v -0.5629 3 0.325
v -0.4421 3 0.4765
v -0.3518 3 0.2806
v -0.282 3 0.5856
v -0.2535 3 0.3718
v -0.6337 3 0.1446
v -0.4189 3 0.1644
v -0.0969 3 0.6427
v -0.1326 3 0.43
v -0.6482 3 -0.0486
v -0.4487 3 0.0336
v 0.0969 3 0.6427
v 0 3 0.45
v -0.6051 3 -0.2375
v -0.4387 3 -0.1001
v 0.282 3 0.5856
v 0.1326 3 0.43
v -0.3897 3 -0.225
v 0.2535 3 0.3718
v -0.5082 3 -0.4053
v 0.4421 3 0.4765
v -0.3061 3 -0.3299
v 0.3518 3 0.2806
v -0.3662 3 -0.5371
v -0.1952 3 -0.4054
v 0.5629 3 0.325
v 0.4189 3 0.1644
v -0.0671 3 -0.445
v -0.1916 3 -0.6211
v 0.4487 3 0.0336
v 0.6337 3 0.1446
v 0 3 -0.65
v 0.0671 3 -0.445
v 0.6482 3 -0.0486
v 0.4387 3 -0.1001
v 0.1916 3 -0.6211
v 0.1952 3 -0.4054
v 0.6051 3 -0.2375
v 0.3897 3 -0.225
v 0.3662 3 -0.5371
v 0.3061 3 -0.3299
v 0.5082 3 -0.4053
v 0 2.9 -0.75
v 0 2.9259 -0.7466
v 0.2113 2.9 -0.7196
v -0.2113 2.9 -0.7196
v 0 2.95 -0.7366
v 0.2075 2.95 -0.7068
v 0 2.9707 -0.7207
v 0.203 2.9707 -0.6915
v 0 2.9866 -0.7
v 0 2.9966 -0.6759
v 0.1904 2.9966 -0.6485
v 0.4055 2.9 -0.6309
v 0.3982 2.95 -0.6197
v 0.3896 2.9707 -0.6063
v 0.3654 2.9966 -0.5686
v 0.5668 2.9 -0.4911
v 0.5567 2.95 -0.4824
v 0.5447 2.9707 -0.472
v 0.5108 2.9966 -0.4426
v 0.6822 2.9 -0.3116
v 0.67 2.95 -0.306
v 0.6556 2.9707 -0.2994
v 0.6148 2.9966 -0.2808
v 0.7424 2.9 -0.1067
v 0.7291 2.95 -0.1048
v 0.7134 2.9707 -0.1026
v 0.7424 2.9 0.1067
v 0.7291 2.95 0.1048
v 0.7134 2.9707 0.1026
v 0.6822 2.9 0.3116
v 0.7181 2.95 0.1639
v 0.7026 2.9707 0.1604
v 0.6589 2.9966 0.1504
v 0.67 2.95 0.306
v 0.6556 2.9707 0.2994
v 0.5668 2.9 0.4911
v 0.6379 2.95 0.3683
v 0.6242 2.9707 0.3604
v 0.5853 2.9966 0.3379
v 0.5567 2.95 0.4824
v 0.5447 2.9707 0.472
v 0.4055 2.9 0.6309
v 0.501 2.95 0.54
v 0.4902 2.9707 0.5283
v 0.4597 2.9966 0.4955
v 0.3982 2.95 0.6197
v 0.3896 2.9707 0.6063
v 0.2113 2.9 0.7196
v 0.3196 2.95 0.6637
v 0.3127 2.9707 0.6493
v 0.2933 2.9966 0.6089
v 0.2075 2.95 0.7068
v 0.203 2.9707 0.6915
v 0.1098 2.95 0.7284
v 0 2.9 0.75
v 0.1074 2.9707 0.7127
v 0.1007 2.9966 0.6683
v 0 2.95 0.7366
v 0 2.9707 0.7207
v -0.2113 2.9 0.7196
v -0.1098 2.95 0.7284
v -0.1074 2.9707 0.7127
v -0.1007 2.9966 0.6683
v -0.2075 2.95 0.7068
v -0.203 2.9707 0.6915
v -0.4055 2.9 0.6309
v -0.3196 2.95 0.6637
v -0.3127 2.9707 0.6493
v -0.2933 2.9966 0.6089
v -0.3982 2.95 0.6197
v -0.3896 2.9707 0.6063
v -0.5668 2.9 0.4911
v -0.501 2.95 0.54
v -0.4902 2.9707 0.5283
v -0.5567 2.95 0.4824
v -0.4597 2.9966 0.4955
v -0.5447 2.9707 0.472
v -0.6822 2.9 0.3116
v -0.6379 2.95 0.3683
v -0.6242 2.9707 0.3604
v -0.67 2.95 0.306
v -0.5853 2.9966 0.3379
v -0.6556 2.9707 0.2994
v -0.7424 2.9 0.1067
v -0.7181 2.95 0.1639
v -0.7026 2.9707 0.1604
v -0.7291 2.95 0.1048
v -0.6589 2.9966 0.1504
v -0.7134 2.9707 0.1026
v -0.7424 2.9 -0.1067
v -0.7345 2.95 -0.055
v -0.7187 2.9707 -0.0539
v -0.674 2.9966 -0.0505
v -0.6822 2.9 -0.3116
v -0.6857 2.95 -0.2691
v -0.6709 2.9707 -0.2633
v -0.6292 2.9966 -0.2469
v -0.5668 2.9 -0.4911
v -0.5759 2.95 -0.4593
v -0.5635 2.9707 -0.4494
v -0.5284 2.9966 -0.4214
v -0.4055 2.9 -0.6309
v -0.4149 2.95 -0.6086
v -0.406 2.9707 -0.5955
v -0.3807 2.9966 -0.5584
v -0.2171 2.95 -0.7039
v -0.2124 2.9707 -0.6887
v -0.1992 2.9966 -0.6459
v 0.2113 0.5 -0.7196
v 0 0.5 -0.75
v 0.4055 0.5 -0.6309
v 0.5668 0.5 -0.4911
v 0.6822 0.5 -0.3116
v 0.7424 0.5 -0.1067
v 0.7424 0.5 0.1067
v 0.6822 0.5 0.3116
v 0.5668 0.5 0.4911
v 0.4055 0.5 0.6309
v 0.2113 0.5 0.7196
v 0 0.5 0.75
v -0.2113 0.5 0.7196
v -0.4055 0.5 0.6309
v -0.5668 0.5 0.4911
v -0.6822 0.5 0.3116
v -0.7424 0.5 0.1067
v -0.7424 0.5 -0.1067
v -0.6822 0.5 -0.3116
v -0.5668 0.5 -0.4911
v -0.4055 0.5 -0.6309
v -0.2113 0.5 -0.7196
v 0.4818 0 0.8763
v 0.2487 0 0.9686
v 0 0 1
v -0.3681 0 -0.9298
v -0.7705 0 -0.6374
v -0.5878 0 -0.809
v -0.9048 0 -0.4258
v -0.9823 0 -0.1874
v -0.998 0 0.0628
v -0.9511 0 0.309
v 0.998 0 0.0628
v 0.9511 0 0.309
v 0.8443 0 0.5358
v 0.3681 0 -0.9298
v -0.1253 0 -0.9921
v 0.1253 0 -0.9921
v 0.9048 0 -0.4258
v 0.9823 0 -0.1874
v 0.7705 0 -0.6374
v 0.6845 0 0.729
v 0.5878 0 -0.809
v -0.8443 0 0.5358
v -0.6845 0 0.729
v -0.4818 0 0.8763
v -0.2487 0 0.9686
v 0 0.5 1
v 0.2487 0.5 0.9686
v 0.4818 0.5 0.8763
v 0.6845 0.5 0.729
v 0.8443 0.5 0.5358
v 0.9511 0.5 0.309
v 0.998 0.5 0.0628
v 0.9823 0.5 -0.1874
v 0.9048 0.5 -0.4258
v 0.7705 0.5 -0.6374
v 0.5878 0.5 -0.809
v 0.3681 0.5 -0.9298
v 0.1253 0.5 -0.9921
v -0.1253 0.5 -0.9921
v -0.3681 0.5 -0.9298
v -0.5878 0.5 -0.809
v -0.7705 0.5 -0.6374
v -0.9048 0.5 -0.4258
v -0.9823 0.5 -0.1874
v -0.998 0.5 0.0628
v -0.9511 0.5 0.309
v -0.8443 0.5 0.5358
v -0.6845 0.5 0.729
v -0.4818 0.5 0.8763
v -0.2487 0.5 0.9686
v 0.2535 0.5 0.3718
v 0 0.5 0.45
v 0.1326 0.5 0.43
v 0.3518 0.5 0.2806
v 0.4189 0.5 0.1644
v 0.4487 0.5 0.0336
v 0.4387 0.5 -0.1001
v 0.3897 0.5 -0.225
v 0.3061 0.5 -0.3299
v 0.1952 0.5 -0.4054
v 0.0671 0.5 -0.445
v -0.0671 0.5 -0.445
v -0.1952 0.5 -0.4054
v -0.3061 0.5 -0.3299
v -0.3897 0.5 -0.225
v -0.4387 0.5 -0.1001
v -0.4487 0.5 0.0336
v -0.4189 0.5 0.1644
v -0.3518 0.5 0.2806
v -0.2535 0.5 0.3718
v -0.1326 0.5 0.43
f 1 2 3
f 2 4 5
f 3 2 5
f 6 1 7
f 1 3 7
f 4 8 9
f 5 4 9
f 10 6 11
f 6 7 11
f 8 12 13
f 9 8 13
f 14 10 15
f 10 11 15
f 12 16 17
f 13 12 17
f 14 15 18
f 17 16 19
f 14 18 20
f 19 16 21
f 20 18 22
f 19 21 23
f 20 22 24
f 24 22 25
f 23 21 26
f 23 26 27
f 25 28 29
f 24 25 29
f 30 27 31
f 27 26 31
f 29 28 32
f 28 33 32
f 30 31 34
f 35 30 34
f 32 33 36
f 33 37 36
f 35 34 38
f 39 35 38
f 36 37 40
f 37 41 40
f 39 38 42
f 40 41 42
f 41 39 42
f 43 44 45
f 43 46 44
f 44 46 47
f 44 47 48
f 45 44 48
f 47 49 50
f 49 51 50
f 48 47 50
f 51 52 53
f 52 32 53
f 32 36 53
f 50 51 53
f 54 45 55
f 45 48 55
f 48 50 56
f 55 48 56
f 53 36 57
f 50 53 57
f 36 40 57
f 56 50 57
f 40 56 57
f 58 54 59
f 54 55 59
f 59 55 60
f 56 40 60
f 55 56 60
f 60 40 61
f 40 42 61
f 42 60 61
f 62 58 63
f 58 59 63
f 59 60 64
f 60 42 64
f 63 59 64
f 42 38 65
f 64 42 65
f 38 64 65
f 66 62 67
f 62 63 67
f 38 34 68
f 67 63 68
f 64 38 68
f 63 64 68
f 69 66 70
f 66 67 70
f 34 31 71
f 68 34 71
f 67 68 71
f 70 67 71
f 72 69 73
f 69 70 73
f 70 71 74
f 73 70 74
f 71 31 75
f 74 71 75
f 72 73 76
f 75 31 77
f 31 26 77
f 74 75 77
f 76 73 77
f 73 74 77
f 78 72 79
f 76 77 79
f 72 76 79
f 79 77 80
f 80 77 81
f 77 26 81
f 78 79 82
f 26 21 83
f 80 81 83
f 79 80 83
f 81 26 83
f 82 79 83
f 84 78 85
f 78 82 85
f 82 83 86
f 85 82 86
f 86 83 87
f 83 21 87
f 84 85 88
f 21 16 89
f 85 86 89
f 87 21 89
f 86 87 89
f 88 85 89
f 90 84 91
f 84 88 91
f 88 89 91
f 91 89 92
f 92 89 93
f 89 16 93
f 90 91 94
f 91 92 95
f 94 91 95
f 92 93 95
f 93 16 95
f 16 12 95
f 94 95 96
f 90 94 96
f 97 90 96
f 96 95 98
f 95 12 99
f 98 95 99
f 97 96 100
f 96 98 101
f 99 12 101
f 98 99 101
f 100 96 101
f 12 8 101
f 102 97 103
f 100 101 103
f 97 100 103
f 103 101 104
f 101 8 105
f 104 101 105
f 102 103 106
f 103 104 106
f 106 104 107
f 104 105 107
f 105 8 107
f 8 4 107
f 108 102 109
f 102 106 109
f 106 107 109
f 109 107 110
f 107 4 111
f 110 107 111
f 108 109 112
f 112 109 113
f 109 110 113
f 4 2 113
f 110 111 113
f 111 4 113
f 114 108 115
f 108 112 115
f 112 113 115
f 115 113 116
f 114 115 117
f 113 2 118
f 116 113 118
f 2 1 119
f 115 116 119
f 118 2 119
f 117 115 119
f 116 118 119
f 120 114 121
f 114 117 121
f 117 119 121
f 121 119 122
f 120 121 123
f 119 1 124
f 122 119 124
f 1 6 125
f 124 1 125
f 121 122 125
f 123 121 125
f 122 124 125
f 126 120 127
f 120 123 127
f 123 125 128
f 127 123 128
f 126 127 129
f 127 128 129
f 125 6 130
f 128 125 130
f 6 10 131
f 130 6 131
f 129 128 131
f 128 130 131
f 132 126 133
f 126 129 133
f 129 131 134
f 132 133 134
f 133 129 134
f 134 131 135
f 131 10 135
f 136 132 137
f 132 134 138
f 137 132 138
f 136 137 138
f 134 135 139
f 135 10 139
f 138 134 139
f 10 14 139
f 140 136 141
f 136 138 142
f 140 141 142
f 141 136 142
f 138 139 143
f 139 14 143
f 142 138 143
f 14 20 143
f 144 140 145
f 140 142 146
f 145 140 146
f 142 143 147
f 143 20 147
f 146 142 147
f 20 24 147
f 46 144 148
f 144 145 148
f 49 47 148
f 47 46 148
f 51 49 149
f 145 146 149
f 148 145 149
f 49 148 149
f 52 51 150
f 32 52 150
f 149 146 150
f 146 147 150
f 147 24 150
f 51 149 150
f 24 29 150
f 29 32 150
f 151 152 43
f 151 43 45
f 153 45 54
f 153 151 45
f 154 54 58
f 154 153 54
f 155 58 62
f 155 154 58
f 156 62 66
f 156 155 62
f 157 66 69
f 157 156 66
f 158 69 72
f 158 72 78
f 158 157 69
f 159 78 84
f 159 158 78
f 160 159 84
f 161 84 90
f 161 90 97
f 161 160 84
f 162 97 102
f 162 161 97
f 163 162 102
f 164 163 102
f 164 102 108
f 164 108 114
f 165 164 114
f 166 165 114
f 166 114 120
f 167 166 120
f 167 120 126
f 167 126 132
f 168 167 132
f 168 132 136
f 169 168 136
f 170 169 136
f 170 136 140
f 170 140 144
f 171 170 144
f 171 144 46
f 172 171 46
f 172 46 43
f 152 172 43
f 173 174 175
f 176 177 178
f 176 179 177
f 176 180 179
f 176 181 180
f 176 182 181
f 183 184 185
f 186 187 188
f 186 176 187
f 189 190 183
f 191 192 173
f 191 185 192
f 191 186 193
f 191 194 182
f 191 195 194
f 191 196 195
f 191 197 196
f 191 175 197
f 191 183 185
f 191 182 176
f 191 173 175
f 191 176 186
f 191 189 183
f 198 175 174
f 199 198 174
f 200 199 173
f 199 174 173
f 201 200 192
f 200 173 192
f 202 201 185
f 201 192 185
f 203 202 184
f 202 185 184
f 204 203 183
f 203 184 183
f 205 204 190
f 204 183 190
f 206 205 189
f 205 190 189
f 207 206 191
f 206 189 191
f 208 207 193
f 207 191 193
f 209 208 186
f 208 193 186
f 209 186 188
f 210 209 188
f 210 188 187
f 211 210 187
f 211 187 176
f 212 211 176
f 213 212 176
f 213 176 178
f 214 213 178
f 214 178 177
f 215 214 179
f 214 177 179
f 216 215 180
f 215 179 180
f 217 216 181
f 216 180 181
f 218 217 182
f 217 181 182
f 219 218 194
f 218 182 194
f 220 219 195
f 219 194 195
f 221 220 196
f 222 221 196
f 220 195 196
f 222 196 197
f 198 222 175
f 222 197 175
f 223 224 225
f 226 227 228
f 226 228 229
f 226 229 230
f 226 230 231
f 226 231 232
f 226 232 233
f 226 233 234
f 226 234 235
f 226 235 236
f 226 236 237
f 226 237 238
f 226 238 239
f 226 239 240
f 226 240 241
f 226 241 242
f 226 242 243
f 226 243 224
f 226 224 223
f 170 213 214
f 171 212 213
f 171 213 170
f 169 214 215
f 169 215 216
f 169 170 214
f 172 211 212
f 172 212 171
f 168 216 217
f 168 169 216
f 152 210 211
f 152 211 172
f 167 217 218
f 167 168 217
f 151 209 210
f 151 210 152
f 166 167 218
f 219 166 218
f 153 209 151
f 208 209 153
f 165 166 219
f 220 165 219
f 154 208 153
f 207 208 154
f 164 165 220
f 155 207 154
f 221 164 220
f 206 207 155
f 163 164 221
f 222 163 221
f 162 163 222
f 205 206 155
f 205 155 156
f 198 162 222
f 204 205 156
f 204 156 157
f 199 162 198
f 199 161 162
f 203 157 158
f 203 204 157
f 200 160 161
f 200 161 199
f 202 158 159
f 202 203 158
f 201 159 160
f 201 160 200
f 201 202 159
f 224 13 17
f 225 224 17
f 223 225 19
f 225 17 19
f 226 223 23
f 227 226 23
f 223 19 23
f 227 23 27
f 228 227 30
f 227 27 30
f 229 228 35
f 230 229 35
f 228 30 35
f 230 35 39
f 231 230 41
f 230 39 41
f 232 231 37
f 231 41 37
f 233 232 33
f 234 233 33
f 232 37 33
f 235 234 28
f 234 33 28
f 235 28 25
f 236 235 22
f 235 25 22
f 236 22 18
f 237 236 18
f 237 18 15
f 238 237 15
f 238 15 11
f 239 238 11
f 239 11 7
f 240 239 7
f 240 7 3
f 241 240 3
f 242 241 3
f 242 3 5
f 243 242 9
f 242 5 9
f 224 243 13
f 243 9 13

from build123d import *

# Parameters (mm, degrees)
SKIZZE1_R                       = 1
AUFSATZ_LINEAR_AUSTRAGEN1_DEPTH = 0.5
SKIZZE2_R                       = 0.75
AUFSATZ_LINEAR_AUSTRAGEN2_DEPTH = 3
VERRUNDUNG1_R                   = 0.1
SKIZZE3_R                       = 0.45
SCHNITT_LINEAR_AUSTRAGEN1_DEPTH = 2.5


with BuildPart() as part:
    # Skizze1 → Aufsatz-Linear austragen1 (new body)
    with BuildSketch(Plane(origin=(0, 0, 0), x_dir=(1, 0, 0), z_dir=(0, 1, 0))):
        with Locations(Location((0, 0, 0), (0, 0, 270))):
            Circle(SKIZZE1_R)
    extrude(amount=AUFSATZ_LINEAR_AUSTRAGEN1_DEPTH)

    # Skizze2 → Aufsatz-Linear austragen2 (add)
    with BuildSketch(Plane.XZ):
        with Locations(Location((0, 0, 0), (0, 0, 270))):
            Circle(SKIZZE2_R)
    extrude(amount=-AUFSATZ_LINEAR_AUSTRAGEN2_DEPTH)

    # Verrundung1
    verrundung1_edges = [part.edges().sort_by_distance(p)[0] for p in [
        (0, 3, 0.75),
    ]]
    fillet(verrundung1_edges, radius=VERRUNDUNG1_R)

    # Skizze3 → Schnitt-Linear austragen1 (cut)
    with BuildSketch(Plane(origin=(0, 3, 0), x_dir=(1, 0, 0), z_dir=(0, 1, 0))):
        with Locations(Location((0, 0, 0), (0, 0, 270))):
            Circle(SKIZZE3_R)
    extrude(amount=-SCHNITT_LINEAR_AUSTRAGEN1_DEPTH, mode=Mode.SUBTRACT)


solid = part.part
